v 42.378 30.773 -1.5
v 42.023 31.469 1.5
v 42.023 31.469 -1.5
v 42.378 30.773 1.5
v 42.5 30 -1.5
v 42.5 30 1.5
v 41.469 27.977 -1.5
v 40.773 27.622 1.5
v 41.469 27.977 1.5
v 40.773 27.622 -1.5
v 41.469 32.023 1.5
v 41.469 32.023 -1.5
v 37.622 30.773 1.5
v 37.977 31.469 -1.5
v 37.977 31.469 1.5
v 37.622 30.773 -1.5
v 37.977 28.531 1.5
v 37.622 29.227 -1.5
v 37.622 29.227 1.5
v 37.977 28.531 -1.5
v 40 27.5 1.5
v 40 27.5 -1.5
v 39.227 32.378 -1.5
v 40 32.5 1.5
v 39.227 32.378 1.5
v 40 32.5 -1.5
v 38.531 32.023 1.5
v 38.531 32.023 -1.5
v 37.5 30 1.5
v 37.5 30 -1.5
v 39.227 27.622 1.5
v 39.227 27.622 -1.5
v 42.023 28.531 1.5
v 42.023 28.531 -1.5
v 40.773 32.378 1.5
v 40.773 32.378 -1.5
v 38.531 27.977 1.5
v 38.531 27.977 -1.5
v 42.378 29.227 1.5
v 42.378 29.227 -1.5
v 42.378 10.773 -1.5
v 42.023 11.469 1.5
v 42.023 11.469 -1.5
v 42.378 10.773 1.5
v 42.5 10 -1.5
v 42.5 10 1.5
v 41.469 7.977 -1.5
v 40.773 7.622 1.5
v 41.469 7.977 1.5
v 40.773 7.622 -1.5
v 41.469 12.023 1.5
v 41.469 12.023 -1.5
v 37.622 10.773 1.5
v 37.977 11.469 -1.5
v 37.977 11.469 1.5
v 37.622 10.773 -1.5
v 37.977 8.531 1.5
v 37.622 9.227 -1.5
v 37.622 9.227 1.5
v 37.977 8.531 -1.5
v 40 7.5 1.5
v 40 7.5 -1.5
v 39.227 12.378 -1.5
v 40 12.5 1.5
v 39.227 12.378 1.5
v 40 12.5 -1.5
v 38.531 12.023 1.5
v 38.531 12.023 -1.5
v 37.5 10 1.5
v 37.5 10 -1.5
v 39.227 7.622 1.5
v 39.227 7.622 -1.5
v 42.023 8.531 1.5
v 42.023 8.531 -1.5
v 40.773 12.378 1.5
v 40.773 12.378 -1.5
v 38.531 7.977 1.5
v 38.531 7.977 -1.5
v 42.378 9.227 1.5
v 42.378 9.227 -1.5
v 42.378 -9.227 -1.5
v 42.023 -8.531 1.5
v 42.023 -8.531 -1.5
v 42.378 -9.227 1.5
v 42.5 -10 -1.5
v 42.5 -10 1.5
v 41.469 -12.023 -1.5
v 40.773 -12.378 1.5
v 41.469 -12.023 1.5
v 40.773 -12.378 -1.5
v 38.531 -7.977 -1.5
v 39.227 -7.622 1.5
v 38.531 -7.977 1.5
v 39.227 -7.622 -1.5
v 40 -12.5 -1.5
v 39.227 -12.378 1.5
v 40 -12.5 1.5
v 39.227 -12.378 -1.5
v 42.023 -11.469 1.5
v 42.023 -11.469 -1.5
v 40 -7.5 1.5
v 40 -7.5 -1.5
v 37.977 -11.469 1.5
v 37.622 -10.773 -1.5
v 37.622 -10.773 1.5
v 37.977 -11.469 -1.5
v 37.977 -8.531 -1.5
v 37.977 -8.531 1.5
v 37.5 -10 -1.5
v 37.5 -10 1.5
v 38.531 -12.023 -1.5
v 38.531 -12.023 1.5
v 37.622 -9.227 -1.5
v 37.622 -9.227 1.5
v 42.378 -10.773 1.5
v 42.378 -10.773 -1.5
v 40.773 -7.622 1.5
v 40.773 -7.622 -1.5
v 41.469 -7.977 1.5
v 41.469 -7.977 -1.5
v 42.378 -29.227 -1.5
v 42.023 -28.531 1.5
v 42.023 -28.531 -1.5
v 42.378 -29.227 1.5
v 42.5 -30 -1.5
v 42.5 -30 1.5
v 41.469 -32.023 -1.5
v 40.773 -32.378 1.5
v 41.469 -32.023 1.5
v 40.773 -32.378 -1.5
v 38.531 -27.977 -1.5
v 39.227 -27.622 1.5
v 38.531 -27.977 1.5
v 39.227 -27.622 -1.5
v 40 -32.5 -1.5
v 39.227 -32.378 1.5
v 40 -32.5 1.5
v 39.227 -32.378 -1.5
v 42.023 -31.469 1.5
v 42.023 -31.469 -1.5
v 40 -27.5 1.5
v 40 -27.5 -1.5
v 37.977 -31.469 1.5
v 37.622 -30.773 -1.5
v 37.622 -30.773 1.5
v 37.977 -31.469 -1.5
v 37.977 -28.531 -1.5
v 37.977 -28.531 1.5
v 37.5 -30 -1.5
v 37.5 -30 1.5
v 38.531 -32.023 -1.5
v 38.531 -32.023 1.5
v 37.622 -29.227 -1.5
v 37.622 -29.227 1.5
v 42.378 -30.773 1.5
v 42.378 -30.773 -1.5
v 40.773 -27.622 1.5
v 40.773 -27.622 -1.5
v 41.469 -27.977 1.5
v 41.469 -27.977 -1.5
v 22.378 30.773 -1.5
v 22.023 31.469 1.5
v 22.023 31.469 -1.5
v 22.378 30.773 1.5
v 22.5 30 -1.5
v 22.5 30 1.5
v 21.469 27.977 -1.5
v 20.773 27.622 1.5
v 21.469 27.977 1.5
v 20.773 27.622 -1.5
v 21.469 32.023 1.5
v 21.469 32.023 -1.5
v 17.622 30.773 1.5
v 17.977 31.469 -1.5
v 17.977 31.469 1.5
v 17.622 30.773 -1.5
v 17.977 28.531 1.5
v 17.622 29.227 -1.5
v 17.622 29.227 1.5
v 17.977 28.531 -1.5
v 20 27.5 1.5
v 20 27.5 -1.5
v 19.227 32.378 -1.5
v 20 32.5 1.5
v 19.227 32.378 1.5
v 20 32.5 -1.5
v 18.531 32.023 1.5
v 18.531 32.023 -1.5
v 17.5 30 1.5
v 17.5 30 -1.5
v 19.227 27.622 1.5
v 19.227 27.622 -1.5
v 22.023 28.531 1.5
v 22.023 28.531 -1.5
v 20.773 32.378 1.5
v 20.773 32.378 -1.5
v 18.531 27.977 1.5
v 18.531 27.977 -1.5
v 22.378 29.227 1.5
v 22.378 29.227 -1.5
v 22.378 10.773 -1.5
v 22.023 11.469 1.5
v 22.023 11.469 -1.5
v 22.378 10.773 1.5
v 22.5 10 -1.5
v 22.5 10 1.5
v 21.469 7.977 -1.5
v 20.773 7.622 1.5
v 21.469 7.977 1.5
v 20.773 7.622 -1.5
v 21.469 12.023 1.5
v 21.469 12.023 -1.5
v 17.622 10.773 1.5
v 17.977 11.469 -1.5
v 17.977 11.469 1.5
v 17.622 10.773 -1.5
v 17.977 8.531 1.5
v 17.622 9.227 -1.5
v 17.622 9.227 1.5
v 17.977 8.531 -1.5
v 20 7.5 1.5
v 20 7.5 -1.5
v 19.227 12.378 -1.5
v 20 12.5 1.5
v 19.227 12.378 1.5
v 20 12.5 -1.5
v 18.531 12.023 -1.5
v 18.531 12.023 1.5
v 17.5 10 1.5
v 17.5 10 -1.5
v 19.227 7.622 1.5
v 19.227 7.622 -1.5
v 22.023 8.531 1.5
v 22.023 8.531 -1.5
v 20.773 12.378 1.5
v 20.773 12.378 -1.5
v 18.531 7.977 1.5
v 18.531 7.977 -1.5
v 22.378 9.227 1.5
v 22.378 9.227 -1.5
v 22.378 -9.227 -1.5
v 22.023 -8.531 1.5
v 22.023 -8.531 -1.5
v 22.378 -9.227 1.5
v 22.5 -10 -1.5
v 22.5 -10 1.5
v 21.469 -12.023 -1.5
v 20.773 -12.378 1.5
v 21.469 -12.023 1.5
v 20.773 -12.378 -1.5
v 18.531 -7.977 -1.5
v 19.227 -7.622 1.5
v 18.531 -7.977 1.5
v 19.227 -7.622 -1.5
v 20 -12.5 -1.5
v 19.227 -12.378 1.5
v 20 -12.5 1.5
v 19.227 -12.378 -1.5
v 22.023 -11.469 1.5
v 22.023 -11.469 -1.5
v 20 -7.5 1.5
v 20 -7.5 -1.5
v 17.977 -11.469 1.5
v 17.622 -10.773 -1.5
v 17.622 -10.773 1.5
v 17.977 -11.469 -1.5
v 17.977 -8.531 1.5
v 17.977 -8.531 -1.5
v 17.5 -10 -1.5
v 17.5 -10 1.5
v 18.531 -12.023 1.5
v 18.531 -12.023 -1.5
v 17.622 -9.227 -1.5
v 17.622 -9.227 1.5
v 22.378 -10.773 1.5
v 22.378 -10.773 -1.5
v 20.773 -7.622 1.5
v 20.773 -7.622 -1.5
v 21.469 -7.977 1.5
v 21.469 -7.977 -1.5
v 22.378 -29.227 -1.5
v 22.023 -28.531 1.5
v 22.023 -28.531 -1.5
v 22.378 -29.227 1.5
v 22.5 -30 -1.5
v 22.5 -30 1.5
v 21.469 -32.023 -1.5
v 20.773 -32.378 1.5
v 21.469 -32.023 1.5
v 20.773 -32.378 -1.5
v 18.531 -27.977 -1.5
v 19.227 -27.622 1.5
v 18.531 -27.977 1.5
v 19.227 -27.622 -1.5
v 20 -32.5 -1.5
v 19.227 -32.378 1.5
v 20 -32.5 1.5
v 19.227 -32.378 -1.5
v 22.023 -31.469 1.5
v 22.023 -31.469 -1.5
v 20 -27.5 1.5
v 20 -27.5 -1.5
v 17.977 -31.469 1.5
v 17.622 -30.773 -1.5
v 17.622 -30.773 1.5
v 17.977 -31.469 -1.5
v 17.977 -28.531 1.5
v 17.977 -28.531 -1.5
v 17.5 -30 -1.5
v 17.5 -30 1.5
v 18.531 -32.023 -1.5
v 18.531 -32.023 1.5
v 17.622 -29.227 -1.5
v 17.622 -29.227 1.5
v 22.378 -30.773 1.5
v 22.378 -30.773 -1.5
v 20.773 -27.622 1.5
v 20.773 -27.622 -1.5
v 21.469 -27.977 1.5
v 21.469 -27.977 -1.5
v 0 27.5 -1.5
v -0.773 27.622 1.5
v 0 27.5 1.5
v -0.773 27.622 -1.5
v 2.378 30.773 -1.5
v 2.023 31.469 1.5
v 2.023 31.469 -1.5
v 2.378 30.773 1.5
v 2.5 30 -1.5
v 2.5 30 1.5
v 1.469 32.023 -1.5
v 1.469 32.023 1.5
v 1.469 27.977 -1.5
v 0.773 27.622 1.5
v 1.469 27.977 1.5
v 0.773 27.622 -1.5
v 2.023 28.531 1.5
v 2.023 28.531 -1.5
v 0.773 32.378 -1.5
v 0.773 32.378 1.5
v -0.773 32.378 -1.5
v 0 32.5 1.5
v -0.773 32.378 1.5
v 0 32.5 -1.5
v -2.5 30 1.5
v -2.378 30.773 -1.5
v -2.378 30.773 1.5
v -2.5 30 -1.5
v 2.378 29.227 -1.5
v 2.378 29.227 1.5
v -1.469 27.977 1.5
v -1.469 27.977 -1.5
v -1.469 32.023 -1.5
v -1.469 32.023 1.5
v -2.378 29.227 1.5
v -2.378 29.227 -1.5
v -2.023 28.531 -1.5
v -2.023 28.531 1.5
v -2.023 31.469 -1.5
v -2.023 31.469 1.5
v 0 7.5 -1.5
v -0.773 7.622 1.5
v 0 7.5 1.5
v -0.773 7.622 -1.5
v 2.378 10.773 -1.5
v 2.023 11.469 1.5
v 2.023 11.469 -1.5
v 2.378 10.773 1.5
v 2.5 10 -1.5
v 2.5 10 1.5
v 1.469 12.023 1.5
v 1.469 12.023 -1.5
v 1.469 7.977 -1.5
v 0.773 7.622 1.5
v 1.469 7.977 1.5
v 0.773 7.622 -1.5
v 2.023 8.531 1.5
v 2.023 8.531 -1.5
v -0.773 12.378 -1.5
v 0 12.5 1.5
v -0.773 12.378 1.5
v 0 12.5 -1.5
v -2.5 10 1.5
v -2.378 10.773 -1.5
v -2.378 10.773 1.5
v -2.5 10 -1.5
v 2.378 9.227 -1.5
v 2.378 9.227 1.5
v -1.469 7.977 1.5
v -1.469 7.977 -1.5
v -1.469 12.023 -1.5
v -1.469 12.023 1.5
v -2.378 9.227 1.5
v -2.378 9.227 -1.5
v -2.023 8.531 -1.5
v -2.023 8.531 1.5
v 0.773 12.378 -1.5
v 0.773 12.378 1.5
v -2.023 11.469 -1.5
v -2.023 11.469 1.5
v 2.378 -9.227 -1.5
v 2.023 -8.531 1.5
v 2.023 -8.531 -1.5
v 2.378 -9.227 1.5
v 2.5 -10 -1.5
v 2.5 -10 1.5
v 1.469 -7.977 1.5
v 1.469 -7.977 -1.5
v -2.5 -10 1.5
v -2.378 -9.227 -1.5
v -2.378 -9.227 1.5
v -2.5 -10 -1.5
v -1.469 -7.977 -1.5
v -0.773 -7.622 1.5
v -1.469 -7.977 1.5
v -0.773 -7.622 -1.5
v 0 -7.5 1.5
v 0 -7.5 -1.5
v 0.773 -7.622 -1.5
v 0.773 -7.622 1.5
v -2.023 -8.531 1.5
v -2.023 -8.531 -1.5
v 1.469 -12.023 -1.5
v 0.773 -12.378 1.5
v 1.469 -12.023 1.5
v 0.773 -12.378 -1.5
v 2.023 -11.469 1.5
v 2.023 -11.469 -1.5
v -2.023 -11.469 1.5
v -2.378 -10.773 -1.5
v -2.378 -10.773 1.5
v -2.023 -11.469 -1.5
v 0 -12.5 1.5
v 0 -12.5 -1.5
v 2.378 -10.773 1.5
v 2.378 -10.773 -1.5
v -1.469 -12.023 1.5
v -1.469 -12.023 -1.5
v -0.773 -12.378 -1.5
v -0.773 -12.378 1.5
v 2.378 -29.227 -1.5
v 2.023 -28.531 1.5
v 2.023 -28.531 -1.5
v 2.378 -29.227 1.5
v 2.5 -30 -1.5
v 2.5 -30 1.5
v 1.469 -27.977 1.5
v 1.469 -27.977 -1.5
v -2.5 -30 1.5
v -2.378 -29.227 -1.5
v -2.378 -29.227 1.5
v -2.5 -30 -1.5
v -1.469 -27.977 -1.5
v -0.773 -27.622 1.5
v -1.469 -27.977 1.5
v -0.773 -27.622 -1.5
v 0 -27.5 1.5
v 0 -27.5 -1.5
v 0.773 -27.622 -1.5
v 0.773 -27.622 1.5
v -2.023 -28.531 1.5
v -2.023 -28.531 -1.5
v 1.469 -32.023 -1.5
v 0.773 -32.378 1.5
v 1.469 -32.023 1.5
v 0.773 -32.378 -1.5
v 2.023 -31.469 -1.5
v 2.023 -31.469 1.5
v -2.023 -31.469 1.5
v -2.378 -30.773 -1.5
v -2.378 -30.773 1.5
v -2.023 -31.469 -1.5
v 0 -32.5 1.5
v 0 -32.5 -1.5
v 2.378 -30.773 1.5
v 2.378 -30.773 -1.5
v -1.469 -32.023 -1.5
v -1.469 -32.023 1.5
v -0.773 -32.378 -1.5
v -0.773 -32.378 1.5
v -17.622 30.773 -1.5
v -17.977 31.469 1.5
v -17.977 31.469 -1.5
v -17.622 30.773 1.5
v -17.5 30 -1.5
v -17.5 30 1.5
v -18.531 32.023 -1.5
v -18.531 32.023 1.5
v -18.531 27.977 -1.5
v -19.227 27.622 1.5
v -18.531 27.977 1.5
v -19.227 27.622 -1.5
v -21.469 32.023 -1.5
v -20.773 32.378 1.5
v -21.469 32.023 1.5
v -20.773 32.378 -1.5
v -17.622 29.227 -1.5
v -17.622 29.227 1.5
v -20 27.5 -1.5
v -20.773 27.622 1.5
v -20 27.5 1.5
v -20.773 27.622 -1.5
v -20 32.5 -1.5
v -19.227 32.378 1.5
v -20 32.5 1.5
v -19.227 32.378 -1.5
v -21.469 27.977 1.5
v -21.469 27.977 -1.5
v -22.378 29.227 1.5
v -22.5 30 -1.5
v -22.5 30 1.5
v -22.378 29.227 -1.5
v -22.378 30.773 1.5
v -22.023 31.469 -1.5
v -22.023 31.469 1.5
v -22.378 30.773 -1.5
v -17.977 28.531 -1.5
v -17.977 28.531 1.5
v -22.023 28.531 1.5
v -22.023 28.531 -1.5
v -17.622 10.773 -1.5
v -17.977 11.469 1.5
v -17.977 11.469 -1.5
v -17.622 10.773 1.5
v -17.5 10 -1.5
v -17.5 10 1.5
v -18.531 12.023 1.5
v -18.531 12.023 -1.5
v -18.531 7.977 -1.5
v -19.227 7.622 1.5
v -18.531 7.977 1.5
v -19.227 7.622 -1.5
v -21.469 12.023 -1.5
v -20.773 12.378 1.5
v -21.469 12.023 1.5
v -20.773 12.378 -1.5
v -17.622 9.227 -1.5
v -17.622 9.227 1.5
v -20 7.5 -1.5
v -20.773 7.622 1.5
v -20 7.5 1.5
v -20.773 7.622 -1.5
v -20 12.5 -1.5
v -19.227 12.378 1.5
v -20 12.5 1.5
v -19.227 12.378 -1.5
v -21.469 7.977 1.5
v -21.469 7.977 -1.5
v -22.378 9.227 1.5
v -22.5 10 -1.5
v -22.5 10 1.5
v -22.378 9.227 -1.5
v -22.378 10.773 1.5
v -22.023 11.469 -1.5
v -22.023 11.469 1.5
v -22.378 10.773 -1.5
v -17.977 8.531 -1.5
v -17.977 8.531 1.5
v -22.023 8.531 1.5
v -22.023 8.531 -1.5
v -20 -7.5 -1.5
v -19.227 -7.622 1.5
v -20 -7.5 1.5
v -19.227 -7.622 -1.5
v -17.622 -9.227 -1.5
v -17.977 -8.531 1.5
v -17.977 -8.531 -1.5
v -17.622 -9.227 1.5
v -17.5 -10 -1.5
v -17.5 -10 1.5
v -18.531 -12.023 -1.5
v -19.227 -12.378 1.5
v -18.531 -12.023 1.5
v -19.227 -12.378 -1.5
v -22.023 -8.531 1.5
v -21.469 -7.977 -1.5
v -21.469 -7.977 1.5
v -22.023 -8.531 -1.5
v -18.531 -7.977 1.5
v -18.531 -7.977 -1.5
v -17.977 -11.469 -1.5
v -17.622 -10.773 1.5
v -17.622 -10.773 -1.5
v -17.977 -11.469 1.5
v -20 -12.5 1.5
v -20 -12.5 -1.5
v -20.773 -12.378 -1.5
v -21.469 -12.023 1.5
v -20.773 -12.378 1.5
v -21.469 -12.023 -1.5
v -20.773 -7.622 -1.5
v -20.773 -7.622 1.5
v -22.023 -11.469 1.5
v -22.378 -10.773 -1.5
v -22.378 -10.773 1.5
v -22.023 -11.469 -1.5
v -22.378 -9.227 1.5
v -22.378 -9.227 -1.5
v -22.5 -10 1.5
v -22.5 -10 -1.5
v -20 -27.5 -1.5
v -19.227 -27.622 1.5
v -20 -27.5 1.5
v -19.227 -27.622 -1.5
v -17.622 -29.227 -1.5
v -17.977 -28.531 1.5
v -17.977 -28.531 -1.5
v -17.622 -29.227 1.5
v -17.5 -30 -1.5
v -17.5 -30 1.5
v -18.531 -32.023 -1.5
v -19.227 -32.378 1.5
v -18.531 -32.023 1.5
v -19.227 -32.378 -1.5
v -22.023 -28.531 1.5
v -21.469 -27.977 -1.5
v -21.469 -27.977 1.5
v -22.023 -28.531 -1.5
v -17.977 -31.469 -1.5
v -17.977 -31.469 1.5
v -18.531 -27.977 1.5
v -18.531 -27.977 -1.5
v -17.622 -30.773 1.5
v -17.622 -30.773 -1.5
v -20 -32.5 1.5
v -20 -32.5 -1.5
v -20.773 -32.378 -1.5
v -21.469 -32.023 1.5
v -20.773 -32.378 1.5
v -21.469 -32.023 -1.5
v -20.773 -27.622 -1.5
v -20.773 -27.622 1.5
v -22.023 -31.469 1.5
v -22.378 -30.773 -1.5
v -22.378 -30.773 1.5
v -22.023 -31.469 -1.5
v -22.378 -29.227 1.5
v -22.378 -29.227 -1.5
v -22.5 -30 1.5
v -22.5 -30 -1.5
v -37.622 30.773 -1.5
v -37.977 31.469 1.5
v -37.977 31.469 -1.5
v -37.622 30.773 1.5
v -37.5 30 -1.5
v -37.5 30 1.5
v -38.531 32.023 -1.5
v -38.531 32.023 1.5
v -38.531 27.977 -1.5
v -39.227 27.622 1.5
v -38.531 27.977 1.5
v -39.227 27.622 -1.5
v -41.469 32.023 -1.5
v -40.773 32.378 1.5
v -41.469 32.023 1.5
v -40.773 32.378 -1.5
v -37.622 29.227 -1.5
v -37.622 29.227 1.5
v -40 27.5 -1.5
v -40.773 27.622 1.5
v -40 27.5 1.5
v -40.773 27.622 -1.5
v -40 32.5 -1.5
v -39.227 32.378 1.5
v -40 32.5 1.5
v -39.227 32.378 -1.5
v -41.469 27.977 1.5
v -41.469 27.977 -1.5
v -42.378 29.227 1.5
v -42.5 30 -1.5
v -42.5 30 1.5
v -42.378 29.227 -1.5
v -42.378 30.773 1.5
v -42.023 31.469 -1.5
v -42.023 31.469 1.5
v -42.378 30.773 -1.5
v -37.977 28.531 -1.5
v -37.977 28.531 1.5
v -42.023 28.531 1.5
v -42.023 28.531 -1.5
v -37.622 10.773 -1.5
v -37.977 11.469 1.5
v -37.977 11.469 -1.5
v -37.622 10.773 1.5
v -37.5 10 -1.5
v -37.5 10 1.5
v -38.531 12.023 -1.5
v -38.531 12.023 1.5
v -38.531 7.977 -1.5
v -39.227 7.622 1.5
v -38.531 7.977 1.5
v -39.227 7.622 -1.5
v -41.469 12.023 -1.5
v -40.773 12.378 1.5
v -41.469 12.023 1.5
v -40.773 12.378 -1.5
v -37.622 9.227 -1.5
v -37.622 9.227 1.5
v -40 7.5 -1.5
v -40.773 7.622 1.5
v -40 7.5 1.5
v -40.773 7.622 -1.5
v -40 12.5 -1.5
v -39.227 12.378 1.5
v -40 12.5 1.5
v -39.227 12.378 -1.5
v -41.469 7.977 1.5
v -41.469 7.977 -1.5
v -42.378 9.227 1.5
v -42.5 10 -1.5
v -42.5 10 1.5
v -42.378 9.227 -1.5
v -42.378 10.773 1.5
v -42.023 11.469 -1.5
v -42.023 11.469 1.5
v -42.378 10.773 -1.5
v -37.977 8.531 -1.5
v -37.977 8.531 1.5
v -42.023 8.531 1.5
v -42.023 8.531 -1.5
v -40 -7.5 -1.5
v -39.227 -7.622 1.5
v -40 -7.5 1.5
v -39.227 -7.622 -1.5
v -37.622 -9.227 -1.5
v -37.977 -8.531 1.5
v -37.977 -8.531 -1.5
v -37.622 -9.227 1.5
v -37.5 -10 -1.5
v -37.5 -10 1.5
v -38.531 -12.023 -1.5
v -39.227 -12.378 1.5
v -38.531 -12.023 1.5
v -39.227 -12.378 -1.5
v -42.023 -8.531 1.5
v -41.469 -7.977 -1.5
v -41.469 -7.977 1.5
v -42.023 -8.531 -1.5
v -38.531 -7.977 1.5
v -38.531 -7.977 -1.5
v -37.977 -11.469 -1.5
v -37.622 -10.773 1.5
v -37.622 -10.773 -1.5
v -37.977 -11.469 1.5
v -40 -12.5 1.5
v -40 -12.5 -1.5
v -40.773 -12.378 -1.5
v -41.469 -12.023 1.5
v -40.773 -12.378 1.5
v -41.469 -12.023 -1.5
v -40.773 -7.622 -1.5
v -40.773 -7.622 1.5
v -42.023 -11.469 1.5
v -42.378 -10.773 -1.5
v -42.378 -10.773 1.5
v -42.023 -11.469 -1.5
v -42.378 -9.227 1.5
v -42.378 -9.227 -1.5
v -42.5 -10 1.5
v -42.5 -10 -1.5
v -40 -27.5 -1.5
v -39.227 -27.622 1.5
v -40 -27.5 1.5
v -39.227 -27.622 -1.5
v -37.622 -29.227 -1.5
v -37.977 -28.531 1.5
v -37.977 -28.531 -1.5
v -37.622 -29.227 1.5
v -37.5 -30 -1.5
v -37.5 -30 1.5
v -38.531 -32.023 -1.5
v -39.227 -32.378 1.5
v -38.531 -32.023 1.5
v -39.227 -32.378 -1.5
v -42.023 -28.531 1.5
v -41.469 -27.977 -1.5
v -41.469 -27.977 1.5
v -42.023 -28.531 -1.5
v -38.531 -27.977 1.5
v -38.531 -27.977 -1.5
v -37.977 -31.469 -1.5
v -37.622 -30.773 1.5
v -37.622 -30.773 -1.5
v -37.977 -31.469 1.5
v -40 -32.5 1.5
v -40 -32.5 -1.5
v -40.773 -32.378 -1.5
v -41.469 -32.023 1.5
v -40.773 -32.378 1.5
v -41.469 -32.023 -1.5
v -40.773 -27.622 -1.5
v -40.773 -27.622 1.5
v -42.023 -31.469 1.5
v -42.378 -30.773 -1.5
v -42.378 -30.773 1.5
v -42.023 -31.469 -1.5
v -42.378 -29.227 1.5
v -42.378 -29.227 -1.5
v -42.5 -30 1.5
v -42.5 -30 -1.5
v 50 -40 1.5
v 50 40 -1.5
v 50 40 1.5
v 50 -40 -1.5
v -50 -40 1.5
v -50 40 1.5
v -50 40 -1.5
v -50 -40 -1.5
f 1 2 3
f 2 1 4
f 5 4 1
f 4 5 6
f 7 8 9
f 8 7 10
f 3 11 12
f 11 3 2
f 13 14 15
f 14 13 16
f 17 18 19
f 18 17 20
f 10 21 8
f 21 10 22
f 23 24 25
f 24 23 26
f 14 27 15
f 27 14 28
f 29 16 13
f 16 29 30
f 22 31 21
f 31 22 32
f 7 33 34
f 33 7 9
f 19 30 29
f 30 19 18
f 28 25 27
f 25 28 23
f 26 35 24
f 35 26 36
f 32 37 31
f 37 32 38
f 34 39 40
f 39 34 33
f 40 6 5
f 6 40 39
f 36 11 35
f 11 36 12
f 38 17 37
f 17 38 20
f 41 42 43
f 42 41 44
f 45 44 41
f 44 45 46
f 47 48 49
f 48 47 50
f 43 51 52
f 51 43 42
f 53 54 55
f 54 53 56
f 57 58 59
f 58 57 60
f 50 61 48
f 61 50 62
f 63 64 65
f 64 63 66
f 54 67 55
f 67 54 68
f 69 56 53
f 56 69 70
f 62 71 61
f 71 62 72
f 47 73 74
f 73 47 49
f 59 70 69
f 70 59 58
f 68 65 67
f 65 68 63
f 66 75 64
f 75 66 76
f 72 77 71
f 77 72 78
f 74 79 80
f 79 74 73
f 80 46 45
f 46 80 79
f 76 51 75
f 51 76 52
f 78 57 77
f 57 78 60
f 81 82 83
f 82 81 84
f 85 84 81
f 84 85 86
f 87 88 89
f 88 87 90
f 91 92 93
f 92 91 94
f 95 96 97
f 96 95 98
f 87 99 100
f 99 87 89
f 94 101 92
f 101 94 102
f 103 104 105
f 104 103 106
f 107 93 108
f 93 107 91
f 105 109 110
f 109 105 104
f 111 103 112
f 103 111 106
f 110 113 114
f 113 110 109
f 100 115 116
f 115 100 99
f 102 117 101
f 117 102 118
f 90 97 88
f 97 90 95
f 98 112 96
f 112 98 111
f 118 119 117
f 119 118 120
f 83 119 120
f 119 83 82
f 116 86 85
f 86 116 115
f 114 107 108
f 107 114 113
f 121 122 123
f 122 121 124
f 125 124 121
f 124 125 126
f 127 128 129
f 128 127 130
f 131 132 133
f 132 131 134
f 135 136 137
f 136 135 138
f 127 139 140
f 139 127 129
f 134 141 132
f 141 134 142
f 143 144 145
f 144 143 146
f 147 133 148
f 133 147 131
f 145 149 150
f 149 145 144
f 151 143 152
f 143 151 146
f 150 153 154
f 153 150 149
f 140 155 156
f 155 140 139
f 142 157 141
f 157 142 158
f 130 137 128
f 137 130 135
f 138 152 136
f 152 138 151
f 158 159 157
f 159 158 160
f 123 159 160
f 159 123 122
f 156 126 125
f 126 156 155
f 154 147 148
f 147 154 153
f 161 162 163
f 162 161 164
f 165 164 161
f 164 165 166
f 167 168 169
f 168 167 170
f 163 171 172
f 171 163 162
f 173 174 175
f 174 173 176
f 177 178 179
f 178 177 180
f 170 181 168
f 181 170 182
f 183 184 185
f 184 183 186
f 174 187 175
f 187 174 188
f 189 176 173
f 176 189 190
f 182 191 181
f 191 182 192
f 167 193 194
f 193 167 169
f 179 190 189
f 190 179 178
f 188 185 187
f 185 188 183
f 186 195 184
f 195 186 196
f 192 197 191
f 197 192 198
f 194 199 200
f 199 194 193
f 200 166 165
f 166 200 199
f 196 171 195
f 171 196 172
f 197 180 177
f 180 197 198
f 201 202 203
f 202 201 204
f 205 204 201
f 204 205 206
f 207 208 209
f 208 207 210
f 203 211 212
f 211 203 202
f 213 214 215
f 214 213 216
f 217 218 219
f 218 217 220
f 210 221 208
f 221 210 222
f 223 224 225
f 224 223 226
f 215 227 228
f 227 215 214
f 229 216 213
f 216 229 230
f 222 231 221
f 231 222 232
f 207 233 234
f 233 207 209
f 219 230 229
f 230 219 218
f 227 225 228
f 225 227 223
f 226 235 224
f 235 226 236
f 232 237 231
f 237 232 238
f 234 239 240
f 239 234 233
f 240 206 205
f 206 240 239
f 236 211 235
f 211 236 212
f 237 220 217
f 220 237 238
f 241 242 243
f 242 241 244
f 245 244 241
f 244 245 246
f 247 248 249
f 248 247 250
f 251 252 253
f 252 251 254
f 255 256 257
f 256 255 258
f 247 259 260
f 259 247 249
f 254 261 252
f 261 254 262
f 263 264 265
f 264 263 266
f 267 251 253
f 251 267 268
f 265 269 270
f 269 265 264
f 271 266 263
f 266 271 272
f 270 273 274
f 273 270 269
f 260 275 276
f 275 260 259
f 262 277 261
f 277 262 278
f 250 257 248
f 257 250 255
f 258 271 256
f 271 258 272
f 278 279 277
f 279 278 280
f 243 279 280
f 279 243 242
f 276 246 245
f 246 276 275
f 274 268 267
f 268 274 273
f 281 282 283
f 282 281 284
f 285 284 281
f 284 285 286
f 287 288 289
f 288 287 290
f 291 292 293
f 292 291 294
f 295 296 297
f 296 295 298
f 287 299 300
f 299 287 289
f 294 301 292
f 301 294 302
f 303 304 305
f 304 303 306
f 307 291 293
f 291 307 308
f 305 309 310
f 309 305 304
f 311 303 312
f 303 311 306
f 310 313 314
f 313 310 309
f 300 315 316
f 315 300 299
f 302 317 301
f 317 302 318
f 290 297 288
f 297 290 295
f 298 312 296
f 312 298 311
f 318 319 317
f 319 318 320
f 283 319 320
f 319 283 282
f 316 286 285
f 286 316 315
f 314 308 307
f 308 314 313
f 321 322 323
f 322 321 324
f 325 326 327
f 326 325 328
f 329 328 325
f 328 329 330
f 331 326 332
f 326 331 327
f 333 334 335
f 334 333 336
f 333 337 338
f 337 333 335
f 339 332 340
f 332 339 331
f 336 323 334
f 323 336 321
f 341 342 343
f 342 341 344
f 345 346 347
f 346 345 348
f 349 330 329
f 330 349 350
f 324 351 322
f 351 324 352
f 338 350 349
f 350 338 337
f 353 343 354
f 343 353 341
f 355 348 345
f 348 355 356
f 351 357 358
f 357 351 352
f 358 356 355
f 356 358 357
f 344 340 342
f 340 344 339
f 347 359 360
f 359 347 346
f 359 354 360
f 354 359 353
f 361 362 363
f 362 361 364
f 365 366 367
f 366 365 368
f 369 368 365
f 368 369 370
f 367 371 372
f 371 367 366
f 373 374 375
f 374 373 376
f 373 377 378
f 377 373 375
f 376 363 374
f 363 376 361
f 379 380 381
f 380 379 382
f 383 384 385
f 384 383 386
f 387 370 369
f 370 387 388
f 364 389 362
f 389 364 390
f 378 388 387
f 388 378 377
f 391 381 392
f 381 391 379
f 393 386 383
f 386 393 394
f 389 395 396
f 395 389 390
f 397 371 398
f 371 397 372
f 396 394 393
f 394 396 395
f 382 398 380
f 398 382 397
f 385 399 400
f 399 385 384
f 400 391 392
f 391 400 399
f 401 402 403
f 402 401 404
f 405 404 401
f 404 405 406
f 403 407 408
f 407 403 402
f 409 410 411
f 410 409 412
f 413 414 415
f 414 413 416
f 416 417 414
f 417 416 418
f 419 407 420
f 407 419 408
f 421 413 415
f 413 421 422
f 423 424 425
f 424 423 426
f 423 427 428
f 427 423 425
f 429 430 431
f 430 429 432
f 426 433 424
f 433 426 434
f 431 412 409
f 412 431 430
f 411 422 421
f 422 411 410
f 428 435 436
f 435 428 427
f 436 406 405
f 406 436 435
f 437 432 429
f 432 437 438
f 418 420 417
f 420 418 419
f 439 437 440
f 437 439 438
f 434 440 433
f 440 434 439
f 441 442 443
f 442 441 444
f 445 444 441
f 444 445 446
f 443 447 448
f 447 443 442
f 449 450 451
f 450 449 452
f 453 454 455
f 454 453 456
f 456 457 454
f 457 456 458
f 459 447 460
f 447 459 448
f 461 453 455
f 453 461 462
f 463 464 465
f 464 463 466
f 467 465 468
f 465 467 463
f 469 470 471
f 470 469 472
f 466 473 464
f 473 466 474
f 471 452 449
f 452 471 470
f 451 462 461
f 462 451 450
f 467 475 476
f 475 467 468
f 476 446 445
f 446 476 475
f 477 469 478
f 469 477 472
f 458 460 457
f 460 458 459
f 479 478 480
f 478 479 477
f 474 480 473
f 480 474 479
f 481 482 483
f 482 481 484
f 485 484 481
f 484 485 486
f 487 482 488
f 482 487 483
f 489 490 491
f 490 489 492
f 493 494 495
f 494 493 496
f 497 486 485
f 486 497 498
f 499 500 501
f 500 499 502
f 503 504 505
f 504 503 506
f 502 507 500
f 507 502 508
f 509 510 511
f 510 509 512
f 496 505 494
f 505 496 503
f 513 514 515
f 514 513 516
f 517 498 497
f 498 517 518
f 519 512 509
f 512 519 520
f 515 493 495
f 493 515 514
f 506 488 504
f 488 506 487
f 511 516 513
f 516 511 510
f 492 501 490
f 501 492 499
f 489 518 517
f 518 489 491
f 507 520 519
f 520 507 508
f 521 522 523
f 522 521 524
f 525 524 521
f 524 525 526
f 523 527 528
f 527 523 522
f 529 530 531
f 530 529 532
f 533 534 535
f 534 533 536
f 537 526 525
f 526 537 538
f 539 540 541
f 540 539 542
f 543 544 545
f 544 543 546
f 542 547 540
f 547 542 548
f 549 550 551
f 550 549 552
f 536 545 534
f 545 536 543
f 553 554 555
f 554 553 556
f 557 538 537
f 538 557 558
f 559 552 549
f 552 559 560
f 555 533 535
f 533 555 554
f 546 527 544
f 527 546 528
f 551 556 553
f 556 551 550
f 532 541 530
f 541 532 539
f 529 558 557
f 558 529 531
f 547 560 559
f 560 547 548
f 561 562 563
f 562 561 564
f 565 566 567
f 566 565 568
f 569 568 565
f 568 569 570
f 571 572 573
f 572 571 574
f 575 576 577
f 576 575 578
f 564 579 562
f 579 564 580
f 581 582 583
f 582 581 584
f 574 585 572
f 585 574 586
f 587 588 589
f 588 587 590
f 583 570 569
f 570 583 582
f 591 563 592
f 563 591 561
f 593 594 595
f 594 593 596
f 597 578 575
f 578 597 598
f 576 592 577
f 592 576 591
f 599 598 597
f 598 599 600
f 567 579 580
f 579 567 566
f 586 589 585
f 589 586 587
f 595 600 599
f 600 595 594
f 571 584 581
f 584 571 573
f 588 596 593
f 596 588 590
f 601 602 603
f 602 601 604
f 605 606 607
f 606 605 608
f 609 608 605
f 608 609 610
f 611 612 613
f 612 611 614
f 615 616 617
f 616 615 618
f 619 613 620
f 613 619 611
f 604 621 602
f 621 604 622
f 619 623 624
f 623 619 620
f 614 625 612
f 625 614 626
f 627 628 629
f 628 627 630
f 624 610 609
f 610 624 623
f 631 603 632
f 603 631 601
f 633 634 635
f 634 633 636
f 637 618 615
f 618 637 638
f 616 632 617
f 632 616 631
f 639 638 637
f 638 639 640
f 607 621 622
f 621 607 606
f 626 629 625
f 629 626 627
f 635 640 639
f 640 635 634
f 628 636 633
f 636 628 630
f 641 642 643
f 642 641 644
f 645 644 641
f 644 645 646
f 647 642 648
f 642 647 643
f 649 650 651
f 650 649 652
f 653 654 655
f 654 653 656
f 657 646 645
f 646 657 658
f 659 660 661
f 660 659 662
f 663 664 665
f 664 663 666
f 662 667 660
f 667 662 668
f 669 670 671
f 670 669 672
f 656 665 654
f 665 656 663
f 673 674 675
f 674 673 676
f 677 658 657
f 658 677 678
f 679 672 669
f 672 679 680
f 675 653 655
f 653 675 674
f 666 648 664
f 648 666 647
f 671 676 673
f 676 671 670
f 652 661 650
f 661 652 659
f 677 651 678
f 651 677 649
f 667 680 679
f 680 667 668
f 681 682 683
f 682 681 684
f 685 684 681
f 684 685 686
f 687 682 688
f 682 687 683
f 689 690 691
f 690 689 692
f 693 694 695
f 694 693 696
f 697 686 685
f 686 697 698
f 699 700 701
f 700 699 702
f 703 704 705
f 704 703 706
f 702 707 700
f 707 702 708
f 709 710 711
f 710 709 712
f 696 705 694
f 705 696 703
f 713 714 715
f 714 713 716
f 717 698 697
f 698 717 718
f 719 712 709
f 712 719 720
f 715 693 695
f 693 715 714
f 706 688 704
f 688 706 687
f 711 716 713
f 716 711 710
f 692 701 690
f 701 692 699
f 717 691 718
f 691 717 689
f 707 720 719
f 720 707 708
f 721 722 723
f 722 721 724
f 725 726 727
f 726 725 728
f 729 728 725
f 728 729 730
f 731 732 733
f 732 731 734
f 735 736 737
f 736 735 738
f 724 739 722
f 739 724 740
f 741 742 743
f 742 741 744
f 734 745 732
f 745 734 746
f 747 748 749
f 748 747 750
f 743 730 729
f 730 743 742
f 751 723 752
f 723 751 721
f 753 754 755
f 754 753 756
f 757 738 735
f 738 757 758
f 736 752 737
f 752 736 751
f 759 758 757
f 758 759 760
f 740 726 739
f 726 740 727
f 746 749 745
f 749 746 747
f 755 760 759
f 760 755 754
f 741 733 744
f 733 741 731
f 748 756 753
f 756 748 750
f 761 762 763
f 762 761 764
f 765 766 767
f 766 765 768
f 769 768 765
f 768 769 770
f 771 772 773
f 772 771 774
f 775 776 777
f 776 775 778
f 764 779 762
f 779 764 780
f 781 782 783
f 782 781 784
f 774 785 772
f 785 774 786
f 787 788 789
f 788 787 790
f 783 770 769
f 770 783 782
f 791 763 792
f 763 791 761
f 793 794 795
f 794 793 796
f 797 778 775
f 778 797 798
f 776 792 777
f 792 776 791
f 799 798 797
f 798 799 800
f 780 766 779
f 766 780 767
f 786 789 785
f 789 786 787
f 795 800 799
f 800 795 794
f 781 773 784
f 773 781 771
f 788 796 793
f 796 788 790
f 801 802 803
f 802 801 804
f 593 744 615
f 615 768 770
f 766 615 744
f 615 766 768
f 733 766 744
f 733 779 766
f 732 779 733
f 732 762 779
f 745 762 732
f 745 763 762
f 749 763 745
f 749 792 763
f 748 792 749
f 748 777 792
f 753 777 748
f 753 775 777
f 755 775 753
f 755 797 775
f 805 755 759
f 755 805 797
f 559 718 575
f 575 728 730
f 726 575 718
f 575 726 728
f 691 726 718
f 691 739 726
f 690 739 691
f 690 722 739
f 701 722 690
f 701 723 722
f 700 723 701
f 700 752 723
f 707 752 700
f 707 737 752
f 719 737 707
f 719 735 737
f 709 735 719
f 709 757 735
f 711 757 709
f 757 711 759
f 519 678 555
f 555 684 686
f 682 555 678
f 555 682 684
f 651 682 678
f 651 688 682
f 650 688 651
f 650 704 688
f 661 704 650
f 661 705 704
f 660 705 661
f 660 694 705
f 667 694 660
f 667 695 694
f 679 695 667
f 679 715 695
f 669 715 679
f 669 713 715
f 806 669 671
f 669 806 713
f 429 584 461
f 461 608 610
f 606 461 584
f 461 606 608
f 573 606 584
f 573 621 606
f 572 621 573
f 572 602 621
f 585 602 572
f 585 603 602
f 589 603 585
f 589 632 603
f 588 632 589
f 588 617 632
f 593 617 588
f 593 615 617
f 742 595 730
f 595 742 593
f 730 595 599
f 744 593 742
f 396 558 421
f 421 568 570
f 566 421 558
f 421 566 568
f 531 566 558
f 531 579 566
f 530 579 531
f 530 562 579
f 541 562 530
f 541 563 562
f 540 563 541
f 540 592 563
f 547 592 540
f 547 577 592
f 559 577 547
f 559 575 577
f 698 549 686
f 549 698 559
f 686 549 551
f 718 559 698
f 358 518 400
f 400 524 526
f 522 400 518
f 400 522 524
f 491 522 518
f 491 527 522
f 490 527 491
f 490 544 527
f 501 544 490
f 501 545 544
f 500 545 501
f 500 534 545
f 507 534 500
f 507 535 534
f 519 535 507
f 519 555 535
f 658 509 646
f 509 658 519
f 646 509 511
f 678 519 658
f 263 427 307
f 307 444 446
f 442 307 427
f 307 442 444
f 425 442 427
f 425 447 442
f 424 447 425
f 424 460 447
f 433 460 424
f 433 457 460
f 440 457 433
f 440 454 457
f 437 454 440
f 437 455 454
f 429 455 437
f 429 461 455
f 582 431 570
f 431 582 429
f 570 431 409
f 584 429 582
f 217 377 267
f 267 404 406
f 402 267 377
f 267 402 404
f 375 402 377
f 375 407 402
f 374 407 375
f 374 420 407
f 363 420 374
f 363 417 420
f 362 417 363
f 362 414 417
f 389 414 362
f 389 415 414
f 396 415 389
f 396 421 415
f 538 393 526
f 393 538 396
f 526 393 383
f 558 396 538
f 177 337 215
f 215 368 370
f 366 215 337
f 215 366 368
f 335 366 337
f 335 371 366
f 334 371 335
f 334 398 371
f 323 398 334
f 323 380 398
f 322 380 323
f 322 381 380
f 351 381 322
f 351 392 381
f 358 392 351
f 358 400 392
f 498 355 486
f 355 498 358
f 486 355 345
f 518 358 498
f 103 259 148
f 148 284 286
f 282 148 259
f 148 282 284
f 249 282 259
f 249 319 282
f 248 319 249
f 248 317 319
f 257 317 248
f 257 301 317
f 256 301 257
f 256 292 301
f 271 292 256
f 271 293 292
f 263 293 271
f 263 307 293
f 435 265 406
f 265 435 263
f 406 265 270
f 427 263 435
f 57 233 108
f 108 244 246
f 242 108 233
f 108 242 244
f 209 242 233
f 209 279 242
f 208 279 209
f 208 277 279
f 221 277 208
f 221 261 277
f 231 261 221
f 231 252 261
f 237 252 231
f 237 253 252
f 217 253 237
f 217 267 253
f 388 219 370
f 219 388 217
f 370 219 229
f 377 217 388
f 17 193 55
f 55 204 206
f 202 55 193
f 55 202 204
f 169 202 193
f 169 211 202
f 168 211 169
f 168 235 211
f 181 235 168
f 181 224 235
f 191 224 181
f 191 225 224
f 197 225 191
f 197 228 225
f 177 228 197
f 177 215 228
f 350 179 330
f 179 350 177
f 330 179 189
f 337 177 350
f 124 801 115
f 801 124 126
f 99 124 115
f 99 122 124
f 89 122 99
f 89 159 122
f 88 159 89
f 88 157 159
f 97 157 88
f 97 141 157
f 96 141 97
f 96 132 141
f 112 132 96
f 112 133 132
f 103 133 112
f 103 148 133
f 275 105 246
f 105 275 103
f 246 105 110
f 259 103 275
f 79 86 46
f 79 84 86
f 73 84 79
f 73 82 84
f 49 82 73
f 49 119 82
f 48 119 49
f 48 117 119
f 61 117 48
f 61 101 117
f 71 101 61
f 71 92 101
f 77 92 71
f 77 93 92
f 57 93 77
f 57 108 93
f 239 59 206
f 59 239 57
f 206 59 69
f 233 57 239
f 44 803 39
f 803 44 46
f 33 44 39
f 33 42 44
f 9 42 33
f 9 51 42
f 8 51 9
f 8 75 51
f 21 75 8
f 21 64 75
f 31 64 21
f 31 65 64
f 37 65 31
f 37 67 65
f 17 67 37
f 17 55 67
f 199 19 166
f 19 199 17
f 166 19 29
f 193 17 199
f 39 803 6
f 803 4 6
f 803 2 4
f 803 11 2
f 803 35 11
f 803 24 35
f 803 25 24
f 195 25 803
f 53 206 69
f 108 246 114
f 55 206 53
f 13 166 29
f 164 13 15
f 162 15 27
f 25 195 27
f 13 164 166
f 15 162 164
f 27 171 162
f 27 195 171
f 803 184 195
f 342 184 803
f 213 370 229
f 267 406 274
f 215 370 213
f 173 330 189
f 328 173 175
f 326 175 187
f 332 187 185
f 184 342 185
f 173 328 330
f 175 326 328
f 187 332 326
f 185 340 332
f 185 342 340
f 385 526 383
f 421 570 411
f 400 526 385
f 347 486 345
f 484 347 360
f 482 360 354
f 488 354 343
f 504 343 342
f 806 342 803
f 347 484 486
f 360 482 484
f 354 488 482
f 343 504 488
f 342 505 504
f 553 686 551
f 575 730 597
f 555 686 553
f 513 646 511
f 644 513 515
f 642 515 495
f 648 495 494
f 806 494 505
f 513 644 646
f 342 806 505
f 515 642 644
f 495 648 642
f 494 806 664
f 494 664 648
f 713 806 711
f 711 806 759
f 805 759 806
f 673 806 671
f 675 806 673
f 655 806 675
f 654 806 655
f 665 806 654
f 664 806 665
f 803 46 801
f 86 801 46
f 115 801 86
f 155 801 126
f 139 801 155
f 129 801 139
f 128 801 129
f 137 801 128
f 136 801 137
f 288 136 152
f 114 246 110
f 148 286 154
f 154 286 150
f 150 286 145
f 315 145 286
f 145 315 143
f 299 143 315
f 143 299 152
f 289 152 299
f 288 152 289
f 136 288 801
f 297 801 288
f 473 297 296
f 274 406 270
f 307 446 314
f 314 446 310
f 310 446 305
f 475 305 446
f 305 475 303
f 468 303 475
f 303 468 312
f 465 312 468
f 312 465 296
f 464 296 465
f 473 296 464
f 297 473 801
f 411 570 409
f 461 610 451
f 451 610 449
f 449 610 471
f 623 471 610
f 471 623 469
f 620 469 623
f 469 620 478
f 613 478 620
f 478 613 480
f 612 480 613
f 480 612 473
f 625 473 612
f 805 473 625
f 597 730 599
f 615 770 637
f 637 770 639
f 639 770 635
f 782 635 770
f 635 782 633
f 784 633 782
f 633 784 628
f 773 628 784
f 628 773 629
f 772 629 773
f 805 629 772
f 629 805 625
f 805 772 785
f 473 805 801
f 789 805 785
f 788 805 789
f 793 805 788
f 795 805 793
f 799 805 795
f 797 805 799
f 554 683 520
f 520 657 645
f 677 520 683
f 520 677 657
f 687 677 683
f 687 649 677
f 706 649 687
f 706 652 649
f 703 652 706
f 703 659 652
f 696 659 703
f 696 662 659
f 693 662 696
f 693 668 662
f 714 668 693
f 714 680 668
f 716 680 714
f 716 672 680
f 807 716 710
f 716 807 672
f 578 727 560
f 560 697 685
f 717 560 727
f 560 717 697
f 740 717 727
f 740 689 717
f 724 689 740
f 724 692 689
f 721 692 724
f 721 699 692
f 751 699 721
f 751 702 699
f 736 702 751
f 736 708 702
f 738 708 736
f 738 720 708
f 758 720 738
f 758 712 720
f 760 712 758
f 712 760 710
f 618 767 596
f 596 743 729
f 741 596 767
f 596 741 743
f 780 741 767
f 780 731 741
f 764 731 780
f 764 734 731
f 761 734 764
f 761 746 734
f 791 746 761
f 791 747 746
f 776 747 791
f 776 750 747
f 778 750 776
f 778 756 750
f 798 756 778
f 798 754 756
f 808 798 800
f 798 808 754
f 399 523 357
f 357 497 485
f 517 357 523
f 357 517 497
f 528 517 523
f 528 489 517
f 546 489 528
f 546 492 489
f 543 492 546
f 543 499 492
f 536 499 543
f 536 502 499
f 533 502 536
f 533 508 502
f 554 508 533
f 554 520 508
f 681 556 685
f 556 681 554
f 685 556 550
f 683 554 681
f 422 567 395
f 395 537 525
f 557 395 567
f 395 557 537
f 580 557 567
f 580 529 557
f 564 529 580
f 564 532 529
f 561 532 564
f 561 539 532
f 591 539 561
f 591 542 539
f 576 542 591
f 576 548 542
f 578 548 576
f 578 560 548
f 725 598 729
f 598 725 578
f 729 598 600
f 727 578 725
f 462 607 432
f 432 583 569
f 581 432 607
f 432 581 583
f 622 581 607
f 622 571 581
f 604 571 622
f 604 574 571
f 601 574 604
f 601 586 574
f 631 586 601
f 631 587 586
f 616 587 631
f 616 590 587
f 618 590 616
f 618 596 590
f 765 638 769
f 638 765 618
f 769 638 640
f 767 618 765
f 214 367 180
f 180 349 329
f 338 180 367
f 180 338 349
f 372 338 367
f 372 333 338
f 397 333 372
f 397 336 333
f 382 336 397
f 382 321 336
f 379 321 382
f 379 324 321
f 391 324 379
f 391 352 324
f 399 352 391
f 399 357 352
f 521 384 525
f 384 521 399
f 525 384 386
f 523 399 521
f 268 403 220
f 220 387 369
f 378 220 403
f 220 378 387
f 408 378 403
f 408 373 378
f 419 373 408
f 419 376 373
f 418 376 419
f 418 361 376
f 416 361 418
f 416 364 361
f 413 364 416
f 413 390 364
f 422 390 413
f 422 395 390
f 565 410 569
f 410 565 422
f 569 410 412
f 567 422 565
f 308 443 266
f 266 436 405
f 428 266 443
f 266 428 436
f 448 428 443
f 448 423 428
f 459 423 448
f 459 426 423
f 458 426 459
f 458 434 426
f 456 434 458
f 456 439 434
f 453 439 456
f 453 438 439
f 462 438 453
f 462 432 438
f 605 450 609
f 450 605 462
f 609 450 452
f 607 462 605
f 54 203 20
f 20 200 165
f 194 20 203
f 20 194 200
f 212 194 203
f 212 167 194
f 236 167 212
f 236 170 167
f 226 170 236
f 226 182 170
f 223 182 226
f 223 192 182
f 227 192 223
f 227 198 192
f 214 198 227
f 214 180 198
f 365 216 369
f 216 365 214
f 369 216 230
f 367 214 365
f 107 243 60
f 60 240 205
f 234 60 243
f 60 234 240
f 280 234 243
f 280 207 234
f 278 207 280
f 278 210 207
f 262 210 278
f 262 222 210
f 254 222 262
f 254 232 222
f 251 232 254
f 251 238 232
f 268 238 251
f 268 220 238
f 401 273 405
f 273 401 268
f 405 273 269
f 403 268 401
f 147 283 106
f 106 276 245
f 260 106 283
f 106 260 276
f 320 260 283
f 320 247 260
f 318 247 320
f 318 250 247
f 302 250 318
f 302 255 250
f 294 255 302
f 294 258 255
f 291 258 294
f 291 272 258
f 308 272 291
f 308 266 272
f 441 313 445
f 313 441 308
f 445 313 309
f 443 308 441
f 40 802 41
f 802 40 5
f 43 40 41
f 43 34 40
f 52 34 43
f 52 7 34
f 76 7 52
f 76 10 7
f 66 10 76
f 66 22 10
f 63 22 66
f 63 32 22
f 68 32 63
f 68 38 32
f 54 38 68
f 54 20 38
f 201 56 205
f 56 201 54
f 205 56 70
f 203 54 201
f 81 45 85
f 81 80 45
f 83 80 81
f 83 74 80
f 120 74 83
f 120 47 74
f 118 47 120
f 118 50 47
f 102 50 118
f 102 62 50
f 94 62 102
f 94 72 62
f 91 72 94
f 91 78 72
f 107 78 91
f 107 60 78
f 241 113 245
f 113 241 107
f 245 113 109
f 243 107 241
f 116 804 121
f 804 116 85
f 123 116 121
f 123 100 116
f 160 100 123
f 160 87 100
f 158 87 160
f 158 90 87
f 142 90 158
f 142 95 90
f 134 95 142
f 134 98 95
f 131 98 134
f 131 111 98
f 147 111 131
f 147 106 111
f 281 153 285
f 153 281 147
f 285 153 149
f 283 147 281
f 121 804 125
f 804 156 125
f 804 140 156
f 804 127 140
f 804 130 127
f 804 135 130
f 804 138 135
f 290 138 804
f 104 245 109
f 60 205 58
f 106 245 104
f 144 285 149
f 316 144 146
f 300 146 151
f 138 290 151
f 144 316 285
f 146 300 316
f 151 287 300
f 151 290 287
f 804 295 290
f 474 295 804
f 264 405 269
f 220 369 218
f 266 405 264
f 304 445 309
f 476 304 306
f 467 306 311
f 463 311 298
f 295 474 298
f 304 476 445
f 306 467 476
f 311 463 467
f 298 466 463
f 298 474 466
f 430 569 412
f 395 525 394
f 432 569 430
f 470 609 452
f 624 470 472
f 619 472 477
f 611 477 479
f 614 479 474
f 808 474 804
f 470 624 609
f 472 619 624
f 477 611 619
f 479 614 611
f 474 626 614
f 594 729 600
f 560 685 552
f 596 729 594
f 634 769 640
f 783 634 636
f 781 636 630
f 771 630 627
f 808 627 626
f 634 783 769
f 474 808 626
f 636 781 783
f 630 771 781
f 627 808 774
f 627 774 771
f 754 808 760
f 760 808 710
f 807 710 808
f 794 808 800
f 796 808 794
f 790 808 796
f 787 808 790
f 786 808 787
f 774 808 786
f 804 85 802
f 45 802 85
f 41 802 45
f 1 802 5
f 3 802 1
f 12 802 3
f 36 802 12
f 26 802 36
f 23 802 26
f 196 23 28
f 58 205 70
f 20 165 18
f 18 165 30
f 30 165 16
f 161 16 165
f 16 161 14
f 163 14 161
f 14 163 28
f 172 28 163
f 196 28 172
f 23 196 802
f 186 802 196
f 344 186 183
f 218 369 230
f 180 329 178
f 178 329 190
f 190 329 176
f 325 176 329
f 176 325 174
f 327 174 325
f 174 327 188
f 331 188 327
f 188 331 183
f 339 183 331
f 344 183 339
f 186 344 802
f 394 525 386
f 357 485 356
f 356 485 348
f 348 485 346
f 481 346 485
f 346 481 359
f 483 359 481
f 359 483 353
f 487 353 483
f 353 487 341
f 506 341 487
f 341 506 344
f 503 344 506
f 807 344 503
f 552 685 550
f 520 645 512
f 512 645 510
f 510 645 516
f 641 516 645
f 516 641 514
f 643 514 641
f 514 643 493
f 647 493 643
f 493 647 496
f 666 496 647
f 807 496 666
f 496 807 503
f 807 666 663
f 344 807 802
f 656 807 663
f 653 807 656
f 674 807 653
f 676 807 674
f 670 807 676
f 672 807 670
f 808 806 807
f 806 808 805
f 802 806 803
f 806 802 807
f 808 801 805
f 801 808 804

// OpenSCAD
//Autor: Martín Cancio Barrera, UO287561

baseX = 100;
baseY = 80;
baseZ = 3;

rows = 5;
cols = 4;
d = 5;

diff = 20;
            
module 4X5JP(){
    difference(){
        cube([baseX, baseY, baseZ], center = true);
    
        holes();
    }
}

module holes(){
    x = 40;
    y = 30;
    z = 0;
    
    for (i = [0 : rows - 1]) {
        for(j = [0 : cols - 1]){
            translate([x - diff * i, y - diff * j, z])
                cylinder(h = 5, d = d, $fn = 20, center = true);
        }   
    
    }
}


4X5JP();
